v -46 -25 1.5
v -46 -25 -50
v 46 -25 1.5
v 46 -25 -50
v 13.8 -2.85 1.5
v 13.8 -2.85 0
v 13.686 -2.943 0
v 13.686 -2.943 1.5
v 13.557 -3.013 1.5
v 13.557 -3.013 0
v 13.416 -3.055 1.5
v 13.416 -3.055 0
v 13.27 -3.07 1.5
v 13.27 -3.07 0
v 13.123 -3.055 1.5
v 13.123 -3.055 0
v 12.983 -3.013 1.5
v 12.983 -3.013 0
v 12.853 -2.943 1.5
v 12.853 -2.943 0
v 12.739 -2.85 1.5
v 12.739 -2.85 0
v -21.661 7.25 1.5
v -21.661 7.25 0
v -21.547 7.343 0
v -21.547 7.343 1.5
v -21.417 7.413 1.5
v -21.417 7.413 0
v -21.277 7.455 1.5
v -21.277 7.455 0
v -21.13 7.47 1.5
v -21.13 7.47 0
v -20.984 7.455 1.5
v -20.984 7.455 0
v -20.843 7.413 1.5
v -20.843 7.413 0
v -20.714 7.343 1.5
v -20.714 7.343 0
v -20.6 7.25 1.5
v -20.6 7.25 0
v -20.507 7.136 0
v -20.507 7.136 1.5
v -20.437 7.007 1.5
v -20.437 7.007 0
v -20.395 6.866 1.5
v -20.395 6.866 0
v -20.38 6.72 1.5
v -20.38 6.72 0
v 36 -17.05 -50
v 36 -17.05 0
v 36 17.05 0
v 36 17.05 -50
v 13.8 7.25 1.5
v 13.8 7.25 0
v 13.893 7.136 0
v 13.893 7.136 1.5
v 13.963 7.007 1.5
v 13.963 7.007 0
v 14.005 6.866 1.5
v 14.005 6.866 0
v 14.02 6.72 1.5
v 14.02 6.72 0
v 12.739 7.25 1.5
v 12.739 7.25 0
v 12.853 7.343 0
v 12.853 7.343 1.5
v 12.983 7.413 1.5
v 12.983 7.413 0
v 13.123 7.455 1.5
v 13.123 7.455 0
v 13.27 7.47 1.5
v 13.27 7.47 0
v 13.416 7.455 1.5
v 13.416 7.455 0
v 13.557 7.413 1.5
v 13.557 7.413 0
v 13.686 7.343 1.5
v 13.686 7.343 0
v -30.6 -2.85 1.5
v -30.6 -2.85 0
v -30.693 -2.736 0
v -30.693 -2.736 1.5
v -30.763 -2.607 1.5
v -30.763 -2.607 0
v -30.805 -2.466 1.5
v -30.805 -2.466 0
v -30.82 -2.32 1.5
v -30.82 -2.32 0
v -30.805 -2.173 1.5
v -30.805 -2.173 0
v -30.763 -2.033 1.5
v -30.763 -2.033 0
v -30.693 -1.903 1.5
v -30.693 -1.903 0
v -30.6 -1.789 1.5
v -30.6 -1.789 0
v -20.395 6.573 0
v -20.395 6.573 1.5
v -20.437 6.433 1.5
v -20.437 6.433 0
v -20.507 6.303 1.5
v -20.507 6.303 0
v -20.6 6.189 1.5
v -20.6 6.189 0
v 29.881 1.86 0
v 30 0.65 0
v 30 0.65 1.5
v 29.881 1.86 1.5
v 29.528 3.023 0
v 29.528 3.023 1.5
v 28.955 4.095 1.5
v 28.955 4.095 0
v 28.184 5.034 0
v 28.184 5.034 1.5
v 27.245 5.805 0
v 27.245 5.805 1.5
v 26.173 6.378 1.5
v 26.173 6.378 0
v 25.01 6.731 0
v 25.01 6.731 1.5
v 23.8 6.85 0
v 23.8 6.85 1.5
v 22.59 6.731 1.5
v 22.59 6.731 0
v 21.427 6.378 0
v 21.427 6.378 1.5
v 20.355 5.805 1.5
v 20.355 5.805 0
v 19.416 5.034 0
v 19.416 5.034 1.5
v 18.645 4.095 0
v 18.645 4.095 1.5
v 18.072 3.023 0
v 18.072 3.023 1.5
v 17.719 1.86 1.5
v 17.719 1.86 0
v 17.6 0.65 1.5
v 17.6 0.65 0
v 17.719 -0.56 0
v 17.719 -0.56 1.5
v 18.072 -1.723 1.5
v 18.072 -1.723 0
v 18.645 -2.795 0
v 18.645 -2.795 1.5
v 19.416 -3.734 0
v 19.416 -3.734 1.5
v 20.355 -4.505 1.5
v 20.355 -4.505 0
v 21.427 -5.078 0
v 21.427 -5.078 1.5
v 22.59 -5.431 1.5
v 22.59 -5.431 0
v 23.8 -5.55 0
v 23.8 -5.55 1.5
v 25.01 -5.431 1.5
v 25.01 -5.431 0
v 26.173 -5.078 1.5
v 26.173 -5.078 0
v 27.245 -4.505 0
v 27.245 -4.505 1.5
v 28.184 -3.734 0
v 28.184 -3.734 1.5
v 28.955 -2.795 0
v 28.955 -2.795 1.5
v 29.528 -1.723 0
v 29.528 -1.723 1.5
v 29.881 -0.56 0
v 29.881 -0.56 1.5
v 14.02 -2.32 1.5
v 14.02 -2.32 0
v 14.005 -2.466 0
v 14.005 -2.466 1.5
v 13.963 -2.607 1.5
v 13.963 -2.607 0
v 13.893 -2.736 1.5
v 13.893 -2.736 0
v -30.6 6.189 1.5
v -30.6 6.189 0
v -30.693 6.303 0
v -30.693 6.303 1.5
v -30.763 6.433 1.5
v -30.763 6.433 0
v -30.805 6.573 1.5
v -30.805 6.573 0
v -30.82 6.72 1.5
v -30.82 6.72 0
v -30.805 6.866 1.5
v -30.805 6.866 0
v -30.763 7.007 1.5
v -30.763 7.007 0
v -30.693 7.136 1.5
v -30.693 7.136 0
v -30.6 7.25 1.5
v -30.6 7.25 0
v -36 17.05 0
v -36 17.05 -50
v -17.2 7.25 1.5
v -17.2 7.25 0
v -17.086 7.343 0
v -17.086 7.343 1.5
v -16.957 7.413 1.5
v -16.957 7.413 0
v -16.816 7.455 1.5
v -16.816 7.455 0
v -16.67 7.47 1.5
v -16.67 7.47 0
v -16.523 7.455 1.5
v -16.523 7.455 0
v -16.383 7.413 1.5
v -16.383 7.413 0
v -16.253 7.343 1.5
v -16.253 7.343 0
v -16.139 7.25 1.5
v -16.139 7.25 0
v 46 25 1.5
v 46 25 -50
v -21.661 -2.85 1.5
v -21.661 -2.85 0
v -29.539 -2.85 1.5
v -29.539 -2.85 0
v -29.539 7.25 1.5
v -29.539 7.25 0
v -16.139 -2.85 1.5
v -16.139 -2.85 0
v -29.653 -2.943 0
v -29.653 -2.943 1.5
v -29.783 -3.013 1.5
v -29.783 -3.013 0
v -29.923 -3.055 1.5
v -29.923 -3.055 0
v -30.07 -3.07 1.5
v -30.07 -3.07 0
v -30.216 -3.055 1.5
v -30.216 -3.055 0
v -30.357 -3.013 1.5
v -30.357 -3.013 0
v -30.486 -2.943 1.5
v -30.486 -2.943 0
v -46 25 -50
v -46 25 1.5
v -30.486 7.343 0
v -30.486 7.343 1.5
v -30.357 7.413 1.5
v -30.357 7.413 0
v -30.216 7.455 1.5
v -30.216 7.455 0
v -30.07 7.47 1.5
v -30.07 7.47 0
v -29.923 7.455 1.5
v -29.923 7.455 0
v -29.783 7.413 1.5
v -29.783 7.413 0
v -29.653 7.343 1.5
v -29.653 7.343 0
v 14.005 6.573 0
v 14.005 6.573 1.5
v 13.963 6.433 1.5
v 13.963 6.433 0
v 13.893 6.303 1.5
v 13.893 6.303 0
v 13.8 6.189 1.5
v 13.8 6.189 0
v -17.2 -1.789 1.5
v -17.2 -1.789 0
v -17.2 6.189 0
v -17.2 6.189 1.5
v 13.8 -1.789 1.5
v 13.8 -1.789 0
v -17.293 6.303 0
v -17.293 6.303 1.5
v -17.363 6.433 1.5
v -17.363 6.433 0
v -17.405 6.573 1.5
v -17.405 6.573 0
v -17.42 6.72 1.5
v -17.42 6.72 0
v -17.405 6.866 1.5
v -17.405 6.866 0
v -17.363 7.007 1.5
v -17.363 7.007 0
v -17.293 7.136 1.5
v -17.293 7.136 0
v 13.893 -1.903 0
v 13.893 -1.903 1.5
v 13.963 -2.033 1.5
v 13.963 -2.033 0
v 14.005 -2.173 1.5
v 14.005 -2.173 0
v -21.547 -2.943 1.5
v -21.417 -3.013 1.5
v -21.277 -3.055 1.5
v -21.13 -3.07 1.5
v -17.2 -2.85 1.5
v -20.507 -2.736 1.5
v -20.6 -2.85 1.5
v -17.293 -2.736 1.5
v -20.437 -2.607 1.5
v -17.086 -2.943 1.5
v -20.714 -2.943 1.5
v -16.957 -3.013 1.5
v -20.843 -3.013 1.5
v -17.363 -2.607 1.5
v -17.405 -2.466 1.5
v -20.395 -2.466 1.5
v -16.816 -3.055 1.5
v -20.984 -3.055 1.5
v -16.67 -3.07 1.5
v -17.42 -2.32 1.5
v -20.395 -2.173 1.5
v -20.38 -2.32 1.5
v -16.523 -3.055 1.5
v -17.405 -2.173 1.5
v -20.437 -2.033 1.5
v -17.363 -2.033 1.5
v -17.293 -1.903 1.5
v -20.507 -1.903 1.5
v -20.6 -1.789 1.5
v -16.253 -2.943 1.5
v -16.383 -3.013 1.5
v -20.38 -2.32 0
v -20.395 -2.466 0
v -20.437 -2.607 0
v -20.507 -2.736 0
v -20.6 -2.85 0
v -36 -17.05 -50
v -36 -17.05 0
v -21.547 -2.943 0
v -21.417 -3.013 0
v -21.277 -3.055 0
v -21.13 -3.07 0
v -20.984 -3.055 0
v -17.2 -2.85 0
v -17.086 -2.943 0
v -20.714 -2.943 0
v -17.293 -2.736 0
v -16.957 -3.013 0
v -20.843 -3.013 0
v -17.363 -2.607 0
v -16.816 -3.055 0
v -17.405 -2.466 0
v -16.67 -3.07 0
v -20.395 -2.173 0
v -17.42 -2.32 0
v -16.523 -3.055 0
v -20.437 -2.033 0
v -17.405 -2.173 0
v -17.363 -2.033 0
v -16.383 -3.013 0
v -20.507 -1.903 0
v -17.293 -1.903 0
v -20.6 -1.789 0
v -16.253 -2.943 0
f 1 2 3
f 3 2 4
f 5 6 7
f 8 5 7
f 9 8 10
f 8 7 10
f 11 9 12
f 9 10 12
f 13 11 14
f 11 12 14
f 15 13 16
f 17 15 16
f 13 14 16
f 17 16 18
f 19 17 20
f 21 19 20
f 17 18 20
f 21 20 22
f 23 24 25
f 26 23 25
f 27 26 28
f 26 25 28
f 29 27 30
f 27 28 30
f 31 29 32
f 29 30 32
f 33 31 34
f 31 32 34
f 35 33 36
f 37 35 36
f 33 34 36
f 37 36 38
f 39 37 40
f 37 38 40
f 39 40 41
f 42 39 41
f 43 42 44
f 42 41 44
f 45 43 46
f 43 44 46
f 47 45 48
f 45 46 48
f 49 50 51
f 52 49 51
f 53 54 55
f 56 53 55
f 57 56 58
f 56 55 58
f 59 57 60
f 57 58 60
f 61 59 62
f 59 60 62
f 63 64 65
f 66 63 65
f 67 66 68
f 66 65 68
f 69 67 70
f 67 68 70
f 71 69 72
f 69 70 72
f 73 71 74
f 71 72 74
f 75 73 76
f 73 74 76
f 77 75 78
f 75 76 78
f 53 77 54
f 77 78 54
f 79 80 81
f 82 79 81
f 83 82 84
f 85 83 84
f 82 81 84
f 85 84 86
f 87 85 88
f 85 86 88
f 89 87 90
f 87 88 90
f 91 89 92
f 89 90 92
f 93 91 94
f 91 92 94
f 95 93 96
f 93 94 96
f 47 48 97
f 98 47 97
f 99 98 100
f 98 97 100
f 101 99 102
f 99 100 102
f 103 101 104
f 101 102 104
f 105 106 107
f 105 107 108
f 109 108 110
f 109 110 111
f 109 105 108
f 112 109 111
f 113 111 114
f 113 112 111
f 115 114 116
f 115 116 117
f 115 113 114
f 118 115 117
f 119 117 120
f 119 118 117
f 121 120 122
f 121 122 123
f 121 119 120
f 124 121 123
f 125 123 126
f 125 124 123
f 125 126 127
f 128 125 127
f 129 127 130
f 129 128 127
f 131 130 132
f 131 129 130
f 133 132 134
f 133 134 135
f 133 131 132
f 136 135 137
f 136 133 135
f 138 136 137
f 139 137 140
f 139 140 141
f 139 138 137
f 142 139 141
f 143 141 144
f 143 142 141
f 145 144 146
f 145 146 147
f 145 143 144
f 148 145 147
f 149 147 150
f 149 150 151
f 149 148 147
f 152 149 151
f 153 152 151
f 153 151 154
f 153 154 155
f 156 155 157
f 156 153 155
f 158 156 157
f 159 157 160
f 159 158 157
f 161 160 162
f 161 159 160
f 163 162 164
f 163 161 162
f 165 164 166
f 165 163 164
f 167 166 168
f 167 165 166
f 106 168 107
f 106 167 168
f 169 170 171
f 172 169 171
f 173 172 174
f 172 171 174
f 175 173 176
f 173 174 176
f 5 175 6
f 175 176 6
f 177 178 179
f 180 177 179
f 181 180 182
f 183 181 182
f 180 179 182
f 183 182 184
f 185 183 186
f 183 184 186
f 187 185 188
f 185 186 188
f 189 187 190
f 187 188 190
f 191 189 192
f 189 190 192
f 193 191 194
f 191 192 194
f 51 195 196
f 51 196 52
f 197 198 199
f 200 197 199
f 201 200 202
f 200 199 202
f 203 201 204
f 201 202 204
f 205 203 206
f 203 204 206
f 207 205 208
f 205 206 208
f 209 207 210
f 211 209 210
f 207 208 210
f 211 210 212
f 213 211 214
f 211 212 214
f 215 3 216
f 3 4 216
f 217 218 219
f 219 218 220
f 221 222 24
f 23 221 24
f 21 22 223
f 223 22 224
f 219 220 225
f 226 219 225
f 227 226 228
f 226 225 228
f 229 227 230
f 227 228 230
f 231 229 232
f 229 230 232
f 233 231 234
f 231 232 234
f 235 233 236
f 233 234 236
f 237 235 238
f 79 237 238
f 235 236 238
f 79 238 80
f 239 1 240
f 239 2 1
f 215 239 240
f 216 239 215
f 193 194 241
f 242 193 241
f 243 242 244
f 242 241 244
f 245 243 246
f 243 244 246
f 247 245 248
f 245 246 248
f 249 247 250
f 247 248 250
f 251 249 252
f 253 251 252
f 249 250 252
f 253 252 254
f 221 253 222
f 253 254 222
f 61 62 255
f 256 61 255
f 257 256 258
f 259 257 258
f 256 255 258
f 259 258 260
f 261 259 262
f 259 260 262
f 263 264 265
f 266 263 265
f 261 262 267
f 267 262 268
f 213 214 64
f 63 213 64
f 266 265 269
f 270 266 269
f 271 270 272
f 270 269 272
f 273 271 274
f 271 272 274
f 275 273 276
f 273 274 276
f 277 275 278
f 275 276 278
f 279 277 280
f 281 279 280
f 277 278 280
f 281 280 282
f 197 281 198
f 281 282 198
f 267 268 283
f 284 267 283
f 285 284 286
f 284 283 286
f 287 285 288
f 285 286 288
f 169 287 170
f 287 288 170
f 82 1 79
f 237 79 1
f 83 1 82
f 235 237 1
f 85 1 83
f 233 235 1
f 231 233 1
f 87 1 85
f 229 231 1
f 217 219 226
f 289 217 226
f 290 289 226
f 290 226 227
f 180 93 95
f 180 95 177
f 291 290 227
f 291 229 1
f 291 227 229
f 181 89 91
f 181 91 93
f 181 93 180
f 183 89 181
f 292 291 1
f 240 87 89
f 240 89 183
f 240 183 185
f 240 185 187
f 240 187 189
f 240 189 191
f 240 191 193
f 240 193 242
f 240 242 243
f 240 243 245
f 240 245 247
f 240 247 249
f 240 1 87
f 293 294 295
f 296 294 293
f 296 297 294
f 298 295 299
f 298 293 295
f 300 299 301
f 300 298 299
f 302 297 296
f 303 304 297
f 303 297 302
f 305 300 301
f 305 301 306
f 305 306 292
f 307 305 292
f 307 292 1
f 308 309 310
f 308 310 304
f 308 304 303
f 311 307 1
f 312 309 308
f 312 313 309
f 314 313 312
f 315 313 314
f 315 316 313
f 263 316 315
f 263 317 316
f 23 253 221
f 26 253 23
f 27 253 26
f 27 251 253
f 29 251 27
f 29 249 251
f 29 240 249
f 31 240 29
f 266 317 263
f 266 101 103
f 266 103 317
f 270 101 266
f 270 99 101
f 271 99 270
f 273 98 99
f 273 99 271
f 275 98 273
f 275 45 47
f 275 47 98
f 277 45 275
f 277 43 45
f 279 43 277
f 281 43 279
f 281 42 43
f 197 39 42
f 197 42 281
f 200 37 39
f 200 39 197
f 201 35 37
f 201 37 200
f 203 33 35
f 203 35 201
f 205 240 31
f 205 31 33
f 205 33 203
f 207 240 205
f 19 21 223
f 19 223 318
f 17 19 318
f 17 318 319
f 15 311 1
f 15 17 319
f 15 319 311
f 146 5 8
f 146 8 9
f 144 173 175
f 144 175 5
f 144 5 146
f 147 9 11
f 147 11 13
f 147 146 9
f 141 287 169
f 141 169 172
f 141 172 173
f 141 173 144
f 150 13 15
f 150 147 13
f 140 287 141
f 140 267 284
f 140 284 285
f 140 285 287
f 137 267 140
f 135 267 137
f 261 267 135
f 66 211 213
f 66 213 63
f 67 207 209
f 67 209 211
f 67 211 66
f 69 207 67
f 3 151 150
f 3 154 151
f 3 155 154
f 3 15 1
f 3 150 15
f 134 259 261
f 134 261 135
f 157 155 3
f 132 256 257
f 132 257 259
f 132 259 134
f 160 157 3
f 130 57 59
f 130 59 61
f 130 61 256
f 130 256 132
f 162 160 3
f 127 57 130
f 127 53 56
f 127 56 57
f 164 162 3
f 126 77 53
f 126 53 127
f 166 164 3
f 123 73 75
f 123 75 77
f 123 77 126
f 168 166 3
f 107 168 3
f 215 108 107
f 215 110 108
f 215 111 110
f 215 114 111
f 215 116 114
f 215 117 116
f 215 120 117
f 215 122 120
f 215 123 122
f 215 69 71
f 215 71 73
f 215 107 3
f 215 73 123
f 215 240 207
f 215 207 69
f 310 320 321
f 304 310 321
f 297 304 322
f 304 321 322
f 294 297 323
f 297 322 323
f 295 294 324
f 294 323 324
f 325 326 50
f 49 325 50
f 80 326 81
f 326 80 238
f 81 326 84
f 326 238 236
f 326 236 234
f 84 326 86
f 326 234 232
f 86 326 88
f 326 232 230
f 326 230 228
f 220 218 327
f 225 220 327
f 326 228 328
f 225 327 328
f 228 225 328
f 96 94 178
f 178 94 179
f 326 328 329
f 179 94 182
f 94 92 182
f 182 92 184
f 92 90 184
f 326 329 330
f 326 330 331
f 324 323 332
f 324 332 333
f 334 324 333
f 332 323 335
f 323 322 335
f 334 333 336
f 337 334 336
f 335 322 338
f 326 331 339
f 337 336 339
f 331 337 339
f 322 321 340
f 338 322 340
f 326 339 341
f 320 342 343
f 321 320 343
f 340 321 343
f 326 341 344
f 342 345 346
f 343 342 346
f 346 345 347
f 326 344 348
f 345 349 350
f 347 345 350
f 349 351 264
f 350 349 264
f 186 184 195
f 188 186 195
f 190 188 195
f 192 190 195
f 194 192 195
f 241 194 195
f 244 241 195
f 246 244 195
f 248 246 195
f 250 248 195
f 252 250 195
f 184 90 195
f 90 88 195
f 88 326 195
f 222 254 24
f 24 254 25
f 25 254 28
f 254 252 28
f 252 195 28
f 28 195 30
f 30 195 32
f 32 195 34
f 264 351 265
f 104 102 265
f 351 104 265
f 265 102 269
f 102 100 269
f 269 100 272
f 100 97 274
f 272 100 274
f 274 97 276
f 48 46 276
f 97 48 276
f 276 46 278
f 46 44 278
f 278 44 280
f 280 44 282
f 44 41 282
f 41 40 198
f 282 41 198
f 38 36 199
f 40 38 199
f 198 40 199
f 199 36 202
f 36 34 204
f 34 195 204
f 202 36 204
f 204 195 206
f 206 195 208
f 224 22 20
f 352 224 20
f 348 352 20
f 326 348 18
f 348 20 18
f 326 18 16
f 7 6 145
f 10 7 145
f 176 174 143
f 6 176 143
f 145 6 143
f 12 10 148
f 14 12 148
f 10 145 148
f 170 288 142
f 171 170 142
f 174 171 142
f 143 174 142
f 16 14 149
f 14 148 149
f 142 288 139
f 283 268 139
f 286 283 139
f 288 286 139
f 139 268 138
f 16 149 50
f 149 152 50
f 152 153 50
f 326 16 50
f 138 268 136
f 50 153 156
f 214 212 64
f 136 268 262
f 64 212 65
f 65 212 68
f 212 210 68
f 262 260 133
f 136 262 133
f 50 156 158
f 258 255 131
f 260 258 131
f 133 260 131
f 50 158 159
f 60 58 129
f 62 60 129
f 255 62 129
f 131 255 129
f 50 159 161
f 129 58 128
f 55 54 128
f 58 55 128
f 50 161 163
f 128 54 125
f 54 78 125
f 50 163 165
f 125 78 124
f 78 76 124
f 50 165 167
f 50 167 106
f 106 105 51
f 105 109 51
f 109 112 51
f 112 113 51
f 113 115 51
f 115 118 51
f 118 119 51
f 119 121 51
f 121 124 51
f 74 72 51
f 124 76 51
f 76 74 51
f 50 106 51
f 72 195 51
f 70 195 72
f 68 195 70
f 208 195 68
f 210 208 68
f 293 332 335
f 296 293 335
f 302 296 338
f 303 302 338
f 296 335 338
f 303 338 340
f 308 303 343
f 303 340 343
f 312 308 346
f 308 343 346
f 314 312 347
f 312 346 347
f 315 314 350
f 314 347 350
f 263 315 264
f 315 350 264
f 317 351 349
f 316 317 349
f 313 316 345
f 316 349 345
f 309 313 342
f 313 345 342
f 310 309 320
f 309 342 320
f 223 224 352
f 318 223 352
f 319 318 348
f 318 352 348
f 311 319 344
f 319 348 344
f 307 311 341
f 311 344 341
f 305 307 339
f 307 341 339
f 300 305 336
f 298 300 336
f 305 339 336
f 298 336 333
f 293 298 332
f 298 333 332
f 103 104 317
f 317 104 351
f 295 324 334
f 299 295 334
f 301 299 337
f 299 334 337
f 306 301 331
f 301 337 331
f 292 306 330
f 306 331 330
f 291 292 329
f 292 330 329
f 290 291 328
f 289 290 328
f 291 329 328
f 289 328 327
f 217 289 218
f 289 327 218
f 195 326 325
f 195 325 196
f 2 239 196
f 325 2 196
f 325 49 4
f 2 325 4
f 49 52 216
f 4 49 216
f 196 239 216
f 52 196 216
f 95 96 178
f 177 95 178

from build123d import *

# Parameters (mm, degrees)
F0_W     = 92
F0_H     = 50
F0_W_2   = 72
F0_H_2   = 34.1
F1_DEPTH = 50
F0_R     = 6.2
F2_DEPTH = 1.5


with BuildPart() as f1:
    # F0 (on Top) → F1 (new body)
    with BuildSketch(Plane.XY):
        Rectangle(F0_W, F0_H)
        Rectangle(F0_W_2, F0_H_2, mode=Mode.SUBTRACT)
    extrude(amount=-F1_DEPTH)

    # F0 (on Top) → F2 (join)
    with BuildSketch(Plane.XY):
        Rectangle(F0_W, F0_H)
        Rectangle(F0_W_2, F0_H_2, mode=Mode.SUBTRACT)
        Rectangle(F0_W_2, F0_H_2)
        with BuildLine():
            ThreePointArc((-30.6, 6.18934), (-30.81967, 6.71967), (-30.6, 7.25))
            ThreePointArc((-30.6, 7.25), (-30.06967, 7.46967), (-29.53934, 7.25))
            Line((-29.53934, 7.25), (-21.66066, 7.25))
            ThreePointArc((-21.66066, 7.25), (-21.13033, 7.46967), (-20.6, 7.25))
            ThreePointArc((-20.6, 7.25), (-20.43742, 7.006682), (-20.38033, 6.71967))
            ThreePointArc((-20.38033, 6.71967), (-20.43742, 6.432657), (-20.6, 6.18934))
            Line((-20.6, 6.18934), (-20.6, -1.78934))
            ThreePointArc((-20.6, -1.78934), (-20.43742, -2.032657), (-20.38033, -2.31967))
            ThreePointArc((-20.38033, -2.31967), (-20.43742, -2.606682), (-20.6, -2.85))
            ThreePointArc((-20.6, -2.85), (-21.13033, -3.06967), (-21.66066, -2.85))
            Line((-21.66066, -2.85), (-29.53934, -2.85))
            ThreePointArc((-29.53934, -2.85), (-30.06967, -3.06967), (-30.6, -2.85))
            ThreePointArc((-30.6, -2.85), (-30.81967, -2.31967), (-30.6, -1.78934))
            Line((-30.6, -1.78934), (-30.6, 6.18934))
        make_face(mode=Mode.SUBTRACT)
        with BuildLine():
            ThreePointArc((-17.2, 6.18934), (-17.41967, 6.71967), (-17.2, 7.25))
            ThreePointArc((-17.2, 7.25), (-16.66967, 7.46967), (-16.13934, 7.25))
            Line((-16.13934, 7.25), (12.73934, 7.25))
            ThreePointArc((12.73934, 7.25), (13.26967, 7.46967), (13.8, 7.25))
            ThreePointArc((13.8, 7.25), (13.96258, 7.006682), (14.01967, 6.71967))
            ThreePointArc((14.01967, 6.71967), (13.96258, 6.432657), (13.8, 6.18934))
            Line((13.8, 6.18934), (13.8, -1.78934))
            ThreePointArc((13.8, -1.78934), (13.96258, -2.032657), (14.01967, -2.31967))
            ThreePointArc((14.01967, -2.31967), (13.96258, -2.606682), (13.8, -2.85))
            ThreePointArc((13.8, -2.85), (13.26967, -3.06967), (12.73934, -2.85))
            Line((12.73934, -2.85), (-16.13934, -2.85))
            ThreePointArc((-16.13934, -2.85), (-16.66967, -3.06967), (-17.2, -2.85))
            ThreePointArc((-17.2, -2.85), (-17.41967, -2.31967), (-17.2, -1.78934))
            Line((-17.2, -1.78934), (-17.2, 6.18934))
        make_face(mode=Mode.SUBTRACT)
        with Locations((23.8, 0.65)):
            Circle(F0_R, mode=Mode.SUBTRACT)
    extrude(amount=F2_DEPTH)


solid = f1.part
